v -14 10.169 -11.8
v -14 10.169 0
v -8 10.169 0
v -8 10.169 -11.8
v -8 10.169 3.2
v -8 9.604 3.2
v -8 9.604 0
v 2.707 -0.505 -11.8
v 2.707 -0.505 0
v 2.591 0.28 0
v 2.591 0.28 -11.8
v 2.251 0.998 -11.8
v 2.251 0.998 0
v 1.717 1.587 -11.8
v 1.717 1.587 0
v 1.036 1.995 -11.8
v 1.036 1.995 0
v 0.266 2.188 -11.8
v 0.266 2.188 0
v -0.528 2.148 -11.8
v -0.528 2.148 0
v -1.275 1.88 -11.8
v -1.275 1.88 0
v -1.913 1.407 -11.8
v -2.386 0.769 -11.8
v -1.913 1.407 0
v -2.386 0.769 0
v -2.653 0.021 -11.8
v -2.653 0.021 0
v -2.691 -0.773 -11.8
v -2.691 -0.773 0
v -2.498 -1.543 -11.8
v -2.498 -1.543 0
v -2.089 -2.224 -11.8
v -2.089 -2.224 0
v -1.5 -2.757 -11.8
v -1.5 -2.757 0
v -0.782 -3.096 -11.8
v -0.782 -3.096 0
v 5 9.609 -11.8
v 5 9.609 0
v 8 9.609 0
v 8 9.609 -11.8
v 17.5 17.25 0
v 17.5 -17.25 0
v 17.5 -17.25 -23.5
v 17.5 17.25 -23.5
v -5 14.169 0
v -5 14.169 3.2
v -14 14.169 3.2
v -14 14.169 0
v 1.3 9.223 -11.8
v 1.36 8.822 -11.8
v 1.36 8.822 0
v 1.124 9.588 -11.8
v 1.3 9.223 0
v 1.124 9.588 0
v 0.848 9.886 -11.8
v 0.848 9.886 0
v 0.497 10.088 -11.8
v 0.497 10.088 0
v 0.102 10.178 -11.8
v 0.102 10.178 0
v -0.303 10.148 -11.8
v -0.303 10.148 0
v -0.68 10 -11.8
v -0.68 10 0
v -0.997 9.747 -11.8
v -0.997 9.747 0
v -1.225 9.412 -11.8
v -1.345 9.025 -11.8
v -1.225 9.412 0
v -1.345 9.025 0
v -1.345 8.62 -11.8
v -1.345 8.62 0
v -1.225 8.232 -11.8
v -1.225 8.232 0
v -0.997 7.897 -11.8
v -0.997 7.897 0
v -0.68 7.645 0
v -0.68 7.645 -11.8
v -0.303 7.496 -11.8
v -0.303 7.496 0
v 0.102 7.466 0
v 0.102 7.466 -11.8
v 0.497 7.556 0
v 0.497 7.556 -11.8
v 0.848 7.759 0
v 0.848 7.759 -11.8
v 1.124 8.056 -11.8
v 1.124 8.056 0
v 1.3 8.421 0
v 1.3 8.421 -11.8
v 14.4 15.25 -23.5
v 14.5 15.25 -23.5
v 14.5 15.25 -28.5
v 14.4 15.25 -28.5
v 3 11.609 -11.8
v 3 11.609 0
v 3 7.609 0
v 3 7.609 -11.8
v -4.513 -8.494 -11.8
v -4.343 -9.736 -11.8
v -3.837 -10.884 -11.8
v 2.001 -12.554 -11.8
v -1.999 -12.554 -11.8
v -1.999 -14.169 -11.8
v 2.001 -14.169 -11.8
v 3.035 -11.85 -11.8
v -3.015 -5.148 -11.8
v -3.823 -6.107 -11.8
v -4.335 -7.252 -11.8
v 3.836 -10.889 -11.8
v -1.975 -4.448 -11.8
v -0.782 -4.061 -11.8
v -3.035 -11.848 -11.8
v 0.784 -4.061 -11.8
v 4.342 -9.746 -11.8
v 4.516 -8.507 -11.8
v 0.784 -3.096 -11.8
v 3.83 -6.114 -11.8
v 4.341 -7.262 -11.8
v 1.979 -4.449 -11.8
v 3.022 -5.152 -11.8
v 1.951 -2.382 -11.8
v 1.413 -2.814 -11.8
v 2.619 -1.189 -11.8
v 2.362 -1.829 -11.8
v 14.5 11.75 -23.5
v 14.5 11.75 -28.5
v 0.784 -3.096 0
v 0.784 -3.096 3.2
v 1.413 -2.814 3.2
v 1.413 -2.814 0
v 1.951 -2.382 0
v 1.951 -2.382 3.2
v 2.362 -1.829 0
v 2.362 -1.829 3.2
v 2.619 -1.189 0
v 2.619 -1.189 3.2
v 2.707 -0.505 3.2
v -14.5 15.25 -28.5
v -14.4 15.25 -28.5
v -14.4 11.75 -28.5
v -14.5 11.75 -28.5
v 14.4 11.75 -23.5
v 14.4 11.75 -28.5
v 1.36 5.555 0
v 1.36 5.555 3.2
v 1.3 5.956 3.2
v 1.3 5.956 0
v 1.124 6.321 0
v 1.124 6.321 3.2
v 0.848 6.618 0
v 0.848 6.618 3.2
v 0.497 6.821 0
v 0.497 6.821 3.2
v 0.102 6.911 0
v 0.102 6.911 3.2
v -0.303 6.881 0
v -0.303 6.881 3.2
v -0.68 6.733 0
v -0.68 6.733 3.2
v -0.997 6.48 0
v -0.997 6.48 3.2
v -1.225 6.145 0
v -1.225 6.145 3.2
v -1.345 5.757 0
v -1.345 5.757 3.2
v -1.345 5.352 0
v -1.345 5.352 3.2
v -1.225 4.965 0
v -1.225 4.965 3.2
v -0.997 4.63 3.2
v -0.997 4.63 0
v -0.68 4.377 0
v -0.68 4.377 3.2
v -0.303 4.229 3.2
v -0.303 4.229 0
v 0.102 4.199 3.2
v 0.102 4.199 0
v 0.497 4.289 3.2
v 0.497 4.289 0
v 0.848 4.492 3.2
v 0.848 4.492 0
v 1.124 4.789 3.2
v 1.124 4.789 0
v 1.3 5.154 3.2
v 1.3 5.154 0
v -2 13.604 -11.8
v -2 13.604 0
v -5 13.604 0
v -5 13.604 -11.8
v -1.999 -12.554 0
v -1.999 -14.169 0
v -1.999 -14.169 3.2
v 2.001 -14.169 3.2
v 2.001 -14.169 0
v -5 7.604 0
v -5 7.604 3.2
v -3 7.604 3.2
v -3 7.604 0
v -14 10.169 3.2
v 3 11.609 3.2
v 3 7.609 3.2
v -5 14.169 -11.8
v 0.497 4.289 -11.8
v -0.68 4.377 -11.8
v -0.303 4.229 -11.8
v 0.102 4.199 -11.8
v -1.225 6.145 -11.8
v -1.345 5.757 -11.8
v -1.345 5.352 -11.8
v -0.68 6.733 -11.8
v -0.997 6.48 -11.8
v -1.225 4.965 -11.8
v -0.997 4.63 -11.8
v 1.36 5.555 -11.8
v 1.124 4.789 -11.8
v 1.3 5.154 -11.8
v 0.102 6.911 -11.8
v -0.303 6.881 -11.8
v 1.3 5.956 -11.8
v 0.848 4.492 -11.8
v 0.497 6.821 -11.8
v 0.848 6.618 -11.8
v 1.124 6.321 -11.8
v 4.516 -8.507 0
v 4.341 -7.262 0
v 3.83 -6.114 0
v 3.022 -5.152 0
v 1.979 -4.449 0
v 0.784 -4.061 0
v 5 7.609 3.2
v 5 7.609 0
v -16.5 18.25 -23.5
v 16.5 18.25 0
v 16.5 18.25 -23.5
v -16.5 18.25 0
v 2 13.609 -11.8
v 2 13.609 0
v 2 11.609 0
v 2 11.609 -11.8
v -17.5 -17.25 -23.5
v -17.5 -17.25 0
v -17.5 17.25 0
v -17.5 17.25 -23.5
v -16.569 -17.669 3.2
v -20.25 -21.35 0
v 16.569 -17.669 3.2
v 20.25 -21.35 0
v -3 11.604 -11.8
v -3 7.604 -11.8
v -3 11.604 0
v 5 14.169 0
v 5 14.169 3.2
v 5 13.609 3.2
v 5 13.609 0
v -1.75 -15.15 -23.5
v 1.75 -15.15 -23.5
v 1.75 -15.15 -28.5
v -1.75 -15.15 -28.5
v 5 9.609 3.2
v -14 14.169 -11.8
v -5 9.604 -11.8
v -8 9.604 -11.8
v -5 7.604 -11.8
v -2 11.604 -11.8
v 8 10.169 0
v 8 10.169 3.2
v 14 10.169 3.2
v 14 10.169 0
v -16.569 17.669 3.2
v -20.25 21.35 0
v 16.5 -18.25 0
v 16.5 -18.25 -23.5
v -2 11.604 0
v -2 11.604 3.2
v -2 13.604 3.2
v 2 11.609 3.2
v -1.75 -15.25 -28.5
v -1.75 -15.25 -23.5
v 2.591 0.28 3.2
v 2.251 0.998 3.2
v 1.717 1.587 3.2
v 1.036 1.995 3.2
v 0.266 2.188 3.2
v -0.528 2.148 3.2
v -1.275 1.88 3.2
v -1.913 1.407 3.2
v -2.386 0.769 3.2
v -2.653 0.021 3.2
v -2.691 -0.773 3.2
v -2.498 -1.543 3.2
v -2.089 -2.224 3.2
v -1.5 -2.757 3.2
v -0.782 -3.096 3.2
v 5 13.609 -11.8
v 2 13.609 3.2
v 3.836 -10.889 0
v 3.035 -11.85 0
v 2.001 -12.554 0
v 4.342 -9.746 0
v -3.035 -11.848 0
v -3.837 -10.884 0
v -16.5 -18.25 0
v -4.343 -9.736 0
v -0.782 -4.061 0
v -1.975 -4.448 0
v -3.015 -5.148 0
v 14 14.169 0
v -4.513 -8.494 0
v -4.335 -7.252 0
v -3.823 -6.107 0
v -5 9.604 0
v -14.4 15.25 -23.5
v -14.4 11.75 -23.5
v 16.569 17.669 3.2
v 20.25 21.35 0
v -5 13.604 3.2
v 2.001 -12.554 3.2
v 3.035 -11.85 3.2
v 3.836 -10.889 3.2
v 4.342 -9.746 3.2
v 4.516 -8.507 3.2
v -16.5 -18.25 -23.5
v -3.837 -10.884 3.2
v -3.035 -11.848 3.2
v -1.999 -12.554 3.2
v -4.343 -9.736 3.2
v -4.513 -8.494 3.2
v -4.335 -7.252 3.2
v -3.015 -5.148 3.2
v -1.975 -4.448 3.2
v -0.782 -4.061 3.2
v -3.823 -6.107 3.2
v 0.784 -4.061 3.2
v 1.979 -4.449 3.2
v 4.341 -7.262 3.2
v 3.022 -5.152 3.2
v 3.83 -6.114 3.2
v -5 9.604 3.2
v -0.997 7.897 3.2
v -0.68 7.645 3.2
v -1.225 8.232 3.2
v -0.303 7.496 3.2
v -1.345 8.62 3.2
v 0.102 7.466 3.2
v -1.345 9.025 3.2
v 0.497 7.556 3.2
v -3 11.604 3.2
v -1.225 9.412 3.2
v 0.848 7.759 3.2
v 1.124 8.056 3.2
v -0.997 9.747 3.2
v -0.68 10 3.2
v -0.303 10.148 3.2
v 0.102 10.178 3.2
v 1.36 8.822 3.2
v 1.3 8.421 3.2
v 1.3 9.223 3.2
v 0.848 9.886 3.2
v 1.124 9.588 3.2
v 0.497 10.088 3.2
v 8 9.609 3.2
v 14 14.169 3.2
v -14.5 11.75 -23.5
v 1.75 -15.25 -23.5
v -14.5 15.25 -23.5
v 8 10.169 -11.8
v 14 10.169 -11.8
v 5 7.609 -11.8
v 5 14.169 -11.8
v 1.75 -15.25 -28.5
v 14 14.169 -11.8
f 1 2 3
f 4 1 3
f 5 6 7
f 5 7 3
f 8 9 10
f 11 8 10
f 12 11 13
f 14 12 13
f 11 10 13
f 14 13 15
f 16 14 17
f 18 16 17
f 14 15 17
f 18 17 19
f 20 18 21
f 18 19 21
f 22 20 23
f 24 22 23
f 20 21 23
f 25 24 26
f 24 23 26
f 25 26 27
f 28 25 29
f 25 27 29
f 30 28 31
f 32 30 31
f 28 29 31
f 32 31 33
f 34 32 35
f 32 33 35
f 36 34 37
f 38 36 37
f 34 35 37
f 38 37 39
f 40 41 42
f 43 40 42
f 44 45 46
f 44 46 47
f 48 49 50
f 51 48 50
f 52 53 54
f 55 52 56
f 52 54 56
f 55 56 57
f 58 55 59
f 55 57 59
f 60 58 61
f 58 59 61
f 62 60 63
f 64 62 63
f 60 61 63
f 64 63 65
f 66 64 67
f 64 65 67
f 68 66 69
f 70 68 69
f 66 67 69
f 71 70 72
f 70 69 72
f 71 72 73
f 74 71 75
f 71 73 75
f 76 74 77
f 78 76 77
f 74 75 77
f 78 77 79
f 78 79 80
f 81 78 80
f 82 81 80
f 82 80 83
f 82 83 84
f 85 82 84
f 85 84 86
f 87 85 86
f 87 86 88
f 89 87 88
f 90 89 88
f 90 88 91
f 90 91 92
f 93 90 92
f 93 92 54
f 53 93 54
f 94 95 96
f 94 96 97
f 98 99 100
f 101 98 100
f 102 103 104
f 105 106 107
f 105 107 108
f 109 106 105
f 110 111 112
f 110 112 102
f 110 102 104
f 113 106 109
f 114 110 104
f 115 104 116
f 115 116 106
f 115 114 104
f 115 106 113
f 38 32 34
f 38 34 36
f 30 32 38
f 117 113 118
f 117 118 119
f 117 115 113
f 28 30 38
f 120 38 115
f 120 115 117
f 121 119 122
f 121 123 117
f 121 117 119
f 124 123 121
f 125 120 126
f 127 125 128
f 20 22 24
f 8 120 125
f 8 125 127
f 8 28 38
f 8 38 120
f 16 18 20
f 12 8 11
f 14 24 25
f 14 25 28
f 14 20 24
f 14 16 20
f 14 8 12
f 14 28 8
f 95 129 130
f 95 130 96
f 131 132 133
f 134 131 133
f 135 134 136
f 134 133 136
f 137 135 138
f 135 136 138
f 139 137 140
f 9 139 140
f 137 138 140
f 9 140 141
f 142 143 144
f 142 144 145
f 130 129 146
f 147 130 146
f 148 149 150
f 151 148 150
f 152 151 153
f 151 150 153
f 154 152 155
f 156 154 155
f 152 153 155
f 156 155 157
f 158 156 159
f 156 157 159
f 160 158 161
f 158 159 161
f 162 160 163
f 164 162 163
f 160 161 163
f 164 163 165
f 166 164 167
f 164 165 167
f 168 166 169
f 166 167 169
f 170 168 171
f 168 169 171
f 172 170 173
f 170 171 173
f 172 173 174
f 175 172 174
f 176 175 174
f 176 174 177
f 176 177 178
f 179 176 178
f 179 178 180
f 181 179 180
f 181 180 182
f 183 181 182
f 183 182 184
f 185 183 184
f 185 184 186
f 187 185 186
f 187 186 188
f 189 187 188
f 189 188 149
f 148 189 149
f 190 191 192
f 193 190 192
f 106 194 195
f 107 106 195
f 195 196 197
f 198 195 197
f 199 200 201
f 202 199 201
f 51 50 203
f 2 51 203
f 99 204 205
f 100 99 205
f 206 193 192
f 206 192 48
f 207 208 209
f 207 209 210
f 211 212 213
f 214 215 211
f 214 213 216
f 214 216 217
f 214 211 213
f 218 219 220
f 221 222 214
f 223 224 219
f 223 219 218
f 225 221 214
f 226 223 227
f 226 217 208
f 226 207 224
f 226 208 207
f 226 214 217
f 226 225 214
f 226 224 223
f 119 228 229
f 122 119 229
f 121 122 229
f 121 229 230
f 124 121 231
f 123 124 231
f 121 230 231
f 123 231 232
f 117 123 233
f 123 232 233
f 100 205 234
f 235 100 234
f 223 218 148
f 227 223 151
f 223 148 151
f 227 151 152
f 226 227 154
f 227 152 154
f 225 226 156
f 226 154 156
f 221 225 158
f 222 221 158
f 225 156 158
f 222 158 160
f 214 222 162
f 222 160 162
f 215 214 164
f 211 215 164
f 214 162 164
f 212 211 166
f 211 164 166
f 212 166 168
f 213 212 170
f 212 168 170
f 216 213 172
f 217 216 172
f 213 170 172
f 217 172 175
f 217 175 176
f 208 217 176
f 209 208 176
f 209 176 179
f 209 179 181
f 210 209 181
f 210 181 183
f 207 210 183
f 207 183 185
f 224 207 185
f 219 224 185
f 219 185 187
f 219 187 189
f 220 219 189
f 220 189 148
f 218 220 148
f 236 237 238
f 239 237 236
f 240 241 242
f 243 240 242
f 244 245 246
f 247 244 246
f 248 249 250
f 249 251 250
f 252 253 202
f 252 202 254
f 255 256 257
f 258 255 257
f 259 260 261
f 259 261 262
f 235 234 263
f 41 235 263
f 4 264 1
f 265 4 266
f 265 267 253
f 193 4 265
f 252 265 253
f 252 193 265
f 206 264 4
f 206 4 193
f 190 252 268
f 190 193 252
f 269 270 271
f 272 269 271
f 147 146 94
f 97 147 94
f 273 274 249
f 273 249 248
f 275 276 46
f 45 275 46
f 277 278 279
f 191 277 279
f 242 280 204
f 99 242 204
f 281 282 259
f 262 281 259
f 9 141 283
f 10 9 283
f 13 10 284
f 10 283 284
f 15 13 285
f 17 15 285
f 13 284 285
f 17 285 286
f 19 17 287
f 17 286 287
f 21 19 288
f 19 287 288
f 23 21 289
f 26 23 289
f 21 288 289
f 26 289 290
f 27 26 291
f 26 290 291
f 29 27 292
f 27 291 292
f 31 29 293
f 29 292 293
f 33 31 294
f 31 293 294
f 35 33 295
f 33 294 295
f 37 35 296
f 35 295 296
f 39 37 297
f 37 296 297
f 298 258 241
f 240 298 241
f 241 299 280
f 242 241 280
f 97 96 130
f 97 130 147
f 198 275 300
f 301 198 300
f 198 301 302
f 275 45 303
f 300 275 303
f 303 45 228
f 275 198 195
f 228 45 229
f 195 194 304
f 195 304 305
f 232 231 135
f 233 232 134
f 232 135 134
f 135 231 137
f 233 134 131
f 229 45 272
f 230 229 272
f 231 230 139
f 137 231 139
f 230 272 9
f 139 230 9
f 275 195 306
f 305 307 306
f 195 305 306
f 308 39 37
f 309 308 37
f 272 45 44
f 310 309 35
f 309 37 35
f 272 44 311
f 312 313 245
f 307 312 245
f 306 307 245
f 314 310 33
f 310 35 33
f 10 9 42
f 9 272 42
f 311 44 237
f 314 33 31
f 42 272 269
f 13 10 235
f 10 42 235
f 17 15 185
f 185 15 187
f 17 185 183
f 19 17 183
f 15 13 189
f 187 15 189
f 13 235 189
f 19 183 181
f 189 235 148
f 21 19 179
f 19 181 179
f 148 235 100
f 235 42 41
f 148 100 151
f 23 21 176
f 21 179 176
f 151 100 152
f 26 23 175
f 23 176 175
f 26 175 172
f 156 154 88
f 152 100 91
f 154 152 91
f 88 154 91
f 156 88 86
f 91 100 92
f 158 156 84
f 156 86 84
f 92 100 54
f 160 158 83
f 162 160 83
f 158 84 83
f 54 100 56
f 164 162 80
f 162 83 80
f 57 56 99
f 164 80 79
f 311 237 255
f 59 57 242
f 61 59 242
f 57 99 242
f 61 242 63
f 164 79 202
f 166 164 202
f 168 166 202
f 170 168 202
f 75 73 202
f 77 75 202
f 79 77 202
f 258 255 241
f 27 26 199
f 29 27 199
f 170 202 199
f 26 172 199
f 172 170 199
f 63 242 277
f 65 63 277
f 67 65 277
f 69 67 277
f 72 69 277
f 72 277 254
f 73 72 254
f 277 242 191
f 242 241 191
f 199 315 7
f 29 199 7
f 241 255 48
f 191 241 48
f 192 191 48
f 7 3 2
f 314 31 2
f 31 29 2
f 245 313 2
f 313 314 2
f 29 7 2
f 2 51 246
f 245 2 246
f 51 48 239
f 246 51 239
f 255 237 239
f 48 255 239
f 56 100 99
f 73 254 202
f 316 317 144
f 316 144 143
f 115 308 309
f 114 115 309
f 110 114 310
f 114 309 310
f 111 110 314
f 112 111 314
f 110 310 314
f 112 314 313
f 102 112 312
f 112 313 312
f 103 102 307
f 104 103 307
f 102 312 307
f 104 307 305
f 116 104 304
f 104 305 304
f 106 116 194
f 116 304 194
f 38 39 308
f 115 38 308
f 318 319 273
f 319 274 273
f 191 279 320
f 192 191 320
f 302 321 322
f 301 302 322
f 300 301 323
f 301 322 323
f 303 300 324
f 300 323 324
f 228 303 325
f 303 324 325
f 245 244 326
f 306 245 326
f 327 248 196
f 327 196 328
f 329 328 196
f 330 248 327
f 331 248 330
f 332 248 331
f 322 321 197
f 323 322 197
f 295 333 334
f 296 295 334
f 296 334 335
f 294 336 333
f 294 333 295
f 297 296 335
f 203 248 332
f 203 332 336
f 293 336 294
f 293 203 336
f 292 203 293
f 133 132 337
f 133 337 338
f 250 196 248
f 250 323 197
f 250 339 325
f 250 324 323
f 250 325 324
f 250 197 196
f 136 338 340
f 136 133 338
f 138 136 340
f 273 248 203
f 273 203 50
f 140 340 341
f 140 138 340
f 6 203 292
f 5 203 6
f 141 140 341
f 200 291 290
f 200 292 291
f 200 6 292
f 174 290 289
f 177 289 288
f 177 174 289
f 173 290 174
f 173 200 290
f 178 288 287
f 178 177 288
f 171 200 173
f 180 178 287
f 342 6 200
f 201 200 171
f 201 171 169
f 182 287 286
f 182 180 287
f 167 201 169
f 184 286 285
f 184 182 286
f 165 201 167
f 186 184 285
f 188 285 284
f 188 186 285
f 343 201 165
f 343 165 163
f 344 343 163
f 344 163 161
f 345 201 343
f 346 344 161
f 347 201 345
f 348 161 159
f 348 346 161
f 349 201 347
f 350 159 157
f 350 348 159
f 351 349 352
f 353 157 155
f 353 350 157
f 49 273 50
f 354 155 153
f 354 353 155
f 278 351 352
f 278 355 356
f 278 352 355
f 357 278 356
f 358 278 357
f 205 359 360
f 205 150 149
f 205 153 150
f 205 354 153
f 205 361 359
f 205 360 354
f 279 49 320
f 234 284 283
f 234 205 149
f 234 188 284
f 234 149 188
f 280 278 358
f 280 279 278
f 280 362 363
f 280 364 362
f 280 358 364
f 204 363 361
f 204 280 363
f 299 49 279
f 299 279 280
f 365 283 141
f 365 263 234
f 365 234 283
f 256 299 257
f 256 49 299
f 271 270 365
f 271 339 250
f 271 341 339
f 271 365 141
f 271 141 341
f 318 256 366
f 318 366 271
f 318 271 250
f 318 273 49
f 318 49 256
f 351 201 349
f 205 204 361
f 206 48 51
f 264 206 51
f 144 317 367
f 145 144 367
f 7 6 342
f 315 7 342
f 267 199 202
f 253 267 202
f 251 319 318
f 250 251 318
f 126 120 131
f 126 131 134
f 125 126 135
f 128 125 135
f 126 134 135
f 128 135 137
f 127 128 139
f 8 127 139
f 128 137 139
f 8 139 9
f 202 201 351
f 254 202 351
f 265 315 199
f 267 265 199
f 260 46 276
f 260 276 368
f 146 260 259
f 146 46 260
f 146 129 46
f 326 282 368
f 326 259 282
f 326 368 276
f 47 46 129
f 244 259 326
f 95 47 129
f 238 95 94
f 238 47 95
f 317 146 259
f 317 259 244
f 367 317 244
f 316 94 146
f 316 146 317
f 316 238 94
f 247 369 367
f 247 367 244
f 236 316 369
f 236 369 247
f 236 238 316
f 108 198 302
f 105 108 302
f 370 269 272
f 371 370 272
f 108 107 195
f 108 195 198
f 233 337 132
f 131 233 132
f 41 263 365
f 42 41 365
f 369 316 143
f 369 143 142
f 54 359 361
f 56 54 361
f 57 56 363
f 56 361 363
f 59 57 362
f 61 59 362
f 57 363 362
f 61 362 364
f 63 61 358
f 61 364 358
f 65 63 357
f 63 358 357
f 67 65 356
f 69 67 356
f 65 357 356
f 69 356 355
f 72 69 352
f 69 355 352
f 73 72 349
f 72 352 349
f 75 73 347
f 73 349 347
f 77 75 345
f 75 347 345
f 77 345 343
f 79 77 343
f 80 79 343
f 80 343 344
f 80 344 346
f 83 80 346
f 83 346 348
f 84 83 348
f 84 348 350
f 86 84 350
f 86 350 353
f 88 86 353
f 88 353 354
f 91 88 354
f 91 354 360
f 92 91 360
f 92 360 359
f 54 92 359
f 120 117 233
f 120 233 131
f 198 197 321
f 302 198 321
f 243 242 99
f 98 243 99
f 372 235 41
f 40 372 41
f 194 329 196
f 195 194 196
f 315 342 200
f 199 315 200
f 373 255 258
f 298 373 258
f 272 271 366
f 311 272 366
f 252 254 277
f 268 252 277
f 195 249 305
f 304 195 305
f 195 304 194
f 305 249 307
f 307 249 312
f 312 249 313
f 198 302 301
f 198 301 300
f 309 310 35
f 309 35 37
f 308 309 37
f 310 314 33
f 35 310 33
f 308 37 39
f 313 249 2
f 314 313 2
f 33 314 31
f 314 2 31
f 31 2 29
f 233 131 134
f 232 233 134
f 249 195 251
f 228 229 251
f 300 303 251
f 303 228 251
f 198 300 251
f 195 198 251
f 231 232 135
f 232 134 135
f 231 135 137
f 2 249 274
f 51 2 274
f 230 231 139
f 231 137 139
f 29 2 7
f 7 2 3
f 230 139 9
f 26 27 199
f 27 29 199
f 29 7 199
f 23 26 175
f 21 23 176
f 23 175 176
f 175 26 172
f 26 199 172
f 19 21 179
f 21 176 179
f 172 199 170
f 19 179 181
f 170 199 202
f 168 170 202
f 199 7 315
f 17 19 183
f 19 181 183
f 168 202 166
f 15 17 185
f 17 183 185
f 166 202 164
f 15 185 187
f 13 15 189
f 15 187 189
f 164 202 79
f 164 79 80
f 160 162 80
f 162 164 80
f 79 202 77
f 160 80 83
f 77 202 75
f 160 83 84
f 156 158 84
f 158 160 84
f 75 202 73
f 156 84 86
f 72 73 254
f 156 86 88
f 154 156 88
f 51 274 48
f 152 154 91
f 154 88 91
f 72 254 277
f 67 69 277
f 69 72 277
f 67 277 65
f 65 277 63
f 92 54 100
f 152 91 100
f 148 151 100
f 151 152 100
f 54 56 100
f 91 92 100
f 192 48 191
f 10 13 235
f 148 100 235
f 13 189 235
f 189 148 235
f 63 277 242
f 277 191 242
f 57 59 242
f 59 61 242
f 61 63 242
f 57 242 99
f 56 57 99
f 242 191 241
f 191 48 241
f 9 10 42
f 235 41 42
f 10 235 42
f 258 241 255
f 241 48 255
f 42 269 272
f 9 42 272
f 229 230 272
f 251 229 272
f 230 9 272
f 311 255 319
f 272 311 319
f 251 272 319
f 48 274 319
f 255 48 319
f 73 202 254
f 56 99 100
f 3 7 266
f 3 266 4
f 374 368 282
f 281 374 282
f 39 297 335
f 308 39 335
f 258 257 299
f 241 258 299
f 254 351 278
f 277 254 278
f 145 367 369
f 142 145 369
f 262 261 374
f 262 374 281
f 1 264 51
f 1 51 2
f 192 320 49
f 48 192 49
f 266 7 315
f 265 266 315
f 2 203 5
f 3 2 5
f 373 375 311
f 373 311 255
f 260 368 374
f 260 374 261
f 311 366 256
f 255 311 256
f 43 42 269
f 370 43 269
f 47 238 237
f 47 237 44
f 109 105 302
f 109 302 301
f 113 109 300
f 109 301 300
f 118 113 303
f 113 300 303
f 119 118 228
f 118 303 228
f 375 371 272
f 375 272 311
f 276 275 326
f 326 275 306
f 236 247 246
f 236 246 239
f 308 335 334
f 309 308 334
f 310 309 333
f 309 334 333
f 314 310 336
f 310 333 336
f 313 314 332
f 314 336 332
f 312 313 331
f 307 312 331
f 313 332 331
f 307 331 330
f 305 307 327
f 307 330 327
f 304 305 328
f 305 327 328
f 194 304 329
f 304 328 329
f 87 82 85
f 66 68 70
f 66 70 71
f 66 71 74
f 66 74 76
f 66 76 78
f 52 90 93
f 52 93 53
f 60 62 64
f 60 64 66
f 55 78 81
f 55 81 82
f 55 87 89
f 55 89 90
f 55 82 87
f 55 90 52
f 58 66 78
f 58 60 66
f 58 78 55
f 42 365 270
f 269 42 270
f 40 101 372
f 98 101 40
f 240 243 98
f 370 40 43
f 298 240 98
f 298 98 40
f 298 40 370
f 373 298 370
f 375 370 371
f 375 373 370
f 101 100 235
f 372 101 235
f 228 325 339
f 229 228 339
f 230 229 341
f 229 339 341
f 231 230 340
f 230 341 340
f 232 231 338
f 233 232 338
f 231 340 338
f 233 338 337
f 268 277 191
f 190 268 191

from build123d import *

# Parameters (mm, degrees)
SKETCH1_W           = 40.5
SKETCH1_H           = 42.7
BOSS_EXTRUDE1_DEPTH = 3.2
BOSS_EXTRUDE1_TAPER = 49
SKETCH6_W           = 35
SKETCH6_H           = 36.5
BOSS_EXTRUDE2_DEPTH = 23.5
CUT_EXTRUDE9_DEPTH  = 23.5
SKETCH13_W          = 0.1
SKETCH13_H          = 3.5
SKETCH13_W_2        = 3.5
SKETCH13_H_2        = 0.1
BOSS_EXTRUDE3_DEPTH = 5
SKETCH9_W           = 3
SKETCH9_H           = 0.564389357
SKETCH9_R           = 1.359977184
SKETCH9_H_2         = 1.44
SKETCH9_H_3         = 0.56
SKETCH9_H_4         = 1.435610643
CUT_EXTRUDE12_DEPTH = 15


with BuildPart() as part:
    # Sketch1 → Boss-Extrude1 (new body)
    with BuildSketch(Plane.XY):
        Rectangle(SKETCH1_W, SKETCH1_H)
    extrude(amount=BOSS_EXTRUDE1_DEPTH, taper=BOSS_EXTRUDE1_TAPER)


with BuildPart() as body_2:
    # Sketch6 → Boss-Extrude2 (new body)
    with BuildSketch(Plane(origin=(0, 0, 0), x_dir=(-1, 0, 0), z_dir=(0, 0, -1))):
        Rectangle(SKETCH6_W, SKETCH6_H)
    extrude(amount=BOSS_EXTRUDE2_DEPTH)

    # Sketch7 → Cut-Extrude9 (cut)
    with BuildSketch(Plane(origin=(0, 0, -23.5), x_dir=(-1, 0, 0), z_dir=(0, 0, -1))):
        Polygon((-17.5, 18.25), (-16.5, 18.25), (-17.5, 17.25), align=None)
        Polygon((17.5, 18.25), (17.5, 17.25), (16.5, 18.25), align=None)
        Polygon((17.5, -18.25), (17.5, -17.25), (16.5, -18.25), align=None)
        Polygon((-17.5, -18.25), (-16.5, -18.25), (-17.5, -17.25), align=None)
    extrude(amount=-CUT_EXTRUDE9_DEPTH, mode=Mode.SUBTRACT)

    # Sketch13 → Boss-Extrude3 (add)
    with BuildSketch(Plane(origin=(0, 0, -23.5), x_dir=(-1, 0, 0), z_dir=(0, 0, -1))):
        with Locations((-14.45, 13.5)):
            Rectangle(SKETCH13_W, SKETCH13_H)
        with Locations((14.45, 13.5)):
            Rectangle(SKETCH13_W, SKETCH13_H)
        with Locations((0, -15.2)):
            Rectangle(SKETCH13_W_2, SKETCH13_H_2)
    extrude(amount=BOSS_EXTRUDE3_DEPTH)


with BuildPart() as cut_extrude12_tool:
    # Sketch9 → Cut-Extrude12 (new body)
    with BuildSketch(Plane.XY.offset(3.2)):
        Polygon((-8, 11.60443174), (-5, 11.60443174), (-5, 13.60443174), (-5, 14.168821097), (-14, 14.168821097), (-14, 10.168821097), (-8, 10.168821097), align=None)
        with Locations((-6.5, 9.886626419)):
            Rectangle(SKETCH9_W, SKETCH9_H)
        Polygon((-5, 7.60443174), (-3, 7.60443174), (-3, 11.60443174), (-5, 11.60443174), (-5, 10.168821097), (-5, 9.60443174), align=None)
        Polygon((-5, 11.60443174), (-3, 11.60443174), (-2, 11.60443174), (-2, 13.60443174), (-5, 13.60443174), align=None)
        with Locations((0, 8.822296788)):
            Circle(SKETCH9_R)
        with Locations((0, 5.554779459)):
            Circle(SKETCH9_R)
        Polygon((5, 9.608821097), (5, 10.168821097), (5, 11.608821097), (3, 11.608821097), (3, 7.608821097), (5, 7.608821097), align=None)
        Polygon((3, 11.608821097), (5, 11.608821097), (5, 13.608821097), (2, 13.608821097), (2, 11.608821097), align=None)
        with Locations((6.5, 10.888821097)):
            Rectangle(SKETCH9_W, SKETCH9_H_2)
        with Locations((6.5, 9.888821097)):
            Rectangle(SKETCH9_W, SKETCH9_H_3)
        Polygon((8, 10.168821097), (14, 10.168821097), (14, 14.168821097), (5, 14.168821097), (5, 13.608821097), (5, 11.608821097), (8, 11.608821097), align=None)
        with Locations((-6.5, 10.886626419)):
            Rectangle(SKETCH9_W, SKETCH9_H_4)
        with BuildLine():
            ThreePointArc((2.707069994, -0.505416745), (-1.611804618, 1.667169446), (-0.781711039, -3.09557696))
            Line((-0.781711039, -3.09557696), (-0.781711039, -2.291060405))
            Line((-0.781711039, -2.291060405), (0.784068845, -2.291060405))
            Line((0.784068845, -2.291060405), (0.784068845, -3.09557696))
            ThreePointArc((0.784068845, -3.09557696), (2.173765095, -2.118400266), (2.707069994, -0.505416745))
        make_face()
        with BuildLine():
            Line((-0.781711039, -2.291060405), (-0.781711039, -3.09557696))
            ThreePointArc((-0.781711039, -3.09557696), (0.001178903, -3.211307837), (0.784068845, -3.09557696))
            Line((0.784068845, -3.09557696), (0.784068845, -2.291060405))
            Line((0.784068845, -2.291060405), (-0.781711039, -2.291060405))
        make_face()
        with BuildLine():
            Line((-0.781711039, -3.09557696), (-0.781711039, -4.060830569))
            ThreePointArc((-0.781711039, -4.060830569), (0.001178903, -3.992430641), (0.784068845, -4.060830569))
            Line((0.784068845, -4.060830569), (0.784068845, -3.09557696))
            ThreePointArc((0.784068845, -3.09557696), (0.001178903, -3.211307837), (-0.781711039, -3.09557696))
        make_face()
        with BuildLine():
            ThreePointArc((0.784068845, -4.060830569), (0.001178903, -3.992430641), (-0.781711039, -4.060830569))
            Line((-0.781711039, -4.060830569), (-0.781711039, -5.693800877))
            Line((-0.781711039, -5.693800877), (0.784068845, -5.693800877))
            Line((0.784068845, -5.693800877), (0.784068845, -4.060830569))
        make_face()
        with BuildLine():
            Line((2.001178903, -8.507020293), (2.001178903, -12.554429307))
            ThreePointArc((2.001178903, -12.554429307), (3.835934373, -10.889491743), (4.515768555, -8.507020293))
            ThreePointArc((4.515768555, -8.507020293), (3.459209163, -5.604685638), (0.784068845, -4.060830569))
            Line((0.784068845, -4.060830569), (0.784068845, -5.693800877))
            Line((0.784068845, -5.693800877), (-0.781711039, -5.693800877))
            Line((-0.781711039, -5.693800877), (-0.781711039, -4.060830569))
            ThreePointArc((-0.781711039, -4.060830569), (-4.467761015, -7.866633116), (-1.998821097, -12.554429307))
            Line((-1.998821097, -12.554429307), (-1.998821097, -8.507020293))
            Line((-1.998821097, -8.507020293), (2.001178903, -8.507020293))
        make_face()
        with BuildLine():
            ThreePointArc((-1.998821097, -12.554429307), (0.001178903, -13.021609945), (2.001178903, -12.554429307))
            Line((2.001178903, -12.554429307), (2.001178903, -8.507020293))
            Line((2.001178903, -8.507020293), (-1.998821097, -8.507020293))
            Line((-1.998821097, -8.507020293), (-1.998821097, -12.554429307))
        make_face()
        with BuildLine():
            Line((-1.998821097, -14.168821097), (2.001178903, -14.168821097))
            Line((2.001178903, -14.168821097), (2.001178903, -12.554429307))
            ThreePointArc((2.001178903, -12.554429307), (0.001178903, -13.021609945), (-1.998821097, -12.554429307))
            Line((-1.998821097, -12.554429307), (-1.998821097, -14.168821097))
        make_face()
    extrude(amount=-CUT_EXTRUDE12_DEPTH)


with BuildPart() as part_1:
    add(part.part)

    # Cut-Extrude12: cut by cut_extrude12_tool
    add(cut_extrude12_tool.part, mode=Mode.SUBTRACT)


with BuildPart() as body_2_1:
    add(body_2.part)

    # Cut-Extrude12: cut by cut_extrude12_tool
    add(cut_extrude12_tool.part, mode=Mode.SUBTRACT)


solid = Compound([part_1.part, body_2_1.part])
